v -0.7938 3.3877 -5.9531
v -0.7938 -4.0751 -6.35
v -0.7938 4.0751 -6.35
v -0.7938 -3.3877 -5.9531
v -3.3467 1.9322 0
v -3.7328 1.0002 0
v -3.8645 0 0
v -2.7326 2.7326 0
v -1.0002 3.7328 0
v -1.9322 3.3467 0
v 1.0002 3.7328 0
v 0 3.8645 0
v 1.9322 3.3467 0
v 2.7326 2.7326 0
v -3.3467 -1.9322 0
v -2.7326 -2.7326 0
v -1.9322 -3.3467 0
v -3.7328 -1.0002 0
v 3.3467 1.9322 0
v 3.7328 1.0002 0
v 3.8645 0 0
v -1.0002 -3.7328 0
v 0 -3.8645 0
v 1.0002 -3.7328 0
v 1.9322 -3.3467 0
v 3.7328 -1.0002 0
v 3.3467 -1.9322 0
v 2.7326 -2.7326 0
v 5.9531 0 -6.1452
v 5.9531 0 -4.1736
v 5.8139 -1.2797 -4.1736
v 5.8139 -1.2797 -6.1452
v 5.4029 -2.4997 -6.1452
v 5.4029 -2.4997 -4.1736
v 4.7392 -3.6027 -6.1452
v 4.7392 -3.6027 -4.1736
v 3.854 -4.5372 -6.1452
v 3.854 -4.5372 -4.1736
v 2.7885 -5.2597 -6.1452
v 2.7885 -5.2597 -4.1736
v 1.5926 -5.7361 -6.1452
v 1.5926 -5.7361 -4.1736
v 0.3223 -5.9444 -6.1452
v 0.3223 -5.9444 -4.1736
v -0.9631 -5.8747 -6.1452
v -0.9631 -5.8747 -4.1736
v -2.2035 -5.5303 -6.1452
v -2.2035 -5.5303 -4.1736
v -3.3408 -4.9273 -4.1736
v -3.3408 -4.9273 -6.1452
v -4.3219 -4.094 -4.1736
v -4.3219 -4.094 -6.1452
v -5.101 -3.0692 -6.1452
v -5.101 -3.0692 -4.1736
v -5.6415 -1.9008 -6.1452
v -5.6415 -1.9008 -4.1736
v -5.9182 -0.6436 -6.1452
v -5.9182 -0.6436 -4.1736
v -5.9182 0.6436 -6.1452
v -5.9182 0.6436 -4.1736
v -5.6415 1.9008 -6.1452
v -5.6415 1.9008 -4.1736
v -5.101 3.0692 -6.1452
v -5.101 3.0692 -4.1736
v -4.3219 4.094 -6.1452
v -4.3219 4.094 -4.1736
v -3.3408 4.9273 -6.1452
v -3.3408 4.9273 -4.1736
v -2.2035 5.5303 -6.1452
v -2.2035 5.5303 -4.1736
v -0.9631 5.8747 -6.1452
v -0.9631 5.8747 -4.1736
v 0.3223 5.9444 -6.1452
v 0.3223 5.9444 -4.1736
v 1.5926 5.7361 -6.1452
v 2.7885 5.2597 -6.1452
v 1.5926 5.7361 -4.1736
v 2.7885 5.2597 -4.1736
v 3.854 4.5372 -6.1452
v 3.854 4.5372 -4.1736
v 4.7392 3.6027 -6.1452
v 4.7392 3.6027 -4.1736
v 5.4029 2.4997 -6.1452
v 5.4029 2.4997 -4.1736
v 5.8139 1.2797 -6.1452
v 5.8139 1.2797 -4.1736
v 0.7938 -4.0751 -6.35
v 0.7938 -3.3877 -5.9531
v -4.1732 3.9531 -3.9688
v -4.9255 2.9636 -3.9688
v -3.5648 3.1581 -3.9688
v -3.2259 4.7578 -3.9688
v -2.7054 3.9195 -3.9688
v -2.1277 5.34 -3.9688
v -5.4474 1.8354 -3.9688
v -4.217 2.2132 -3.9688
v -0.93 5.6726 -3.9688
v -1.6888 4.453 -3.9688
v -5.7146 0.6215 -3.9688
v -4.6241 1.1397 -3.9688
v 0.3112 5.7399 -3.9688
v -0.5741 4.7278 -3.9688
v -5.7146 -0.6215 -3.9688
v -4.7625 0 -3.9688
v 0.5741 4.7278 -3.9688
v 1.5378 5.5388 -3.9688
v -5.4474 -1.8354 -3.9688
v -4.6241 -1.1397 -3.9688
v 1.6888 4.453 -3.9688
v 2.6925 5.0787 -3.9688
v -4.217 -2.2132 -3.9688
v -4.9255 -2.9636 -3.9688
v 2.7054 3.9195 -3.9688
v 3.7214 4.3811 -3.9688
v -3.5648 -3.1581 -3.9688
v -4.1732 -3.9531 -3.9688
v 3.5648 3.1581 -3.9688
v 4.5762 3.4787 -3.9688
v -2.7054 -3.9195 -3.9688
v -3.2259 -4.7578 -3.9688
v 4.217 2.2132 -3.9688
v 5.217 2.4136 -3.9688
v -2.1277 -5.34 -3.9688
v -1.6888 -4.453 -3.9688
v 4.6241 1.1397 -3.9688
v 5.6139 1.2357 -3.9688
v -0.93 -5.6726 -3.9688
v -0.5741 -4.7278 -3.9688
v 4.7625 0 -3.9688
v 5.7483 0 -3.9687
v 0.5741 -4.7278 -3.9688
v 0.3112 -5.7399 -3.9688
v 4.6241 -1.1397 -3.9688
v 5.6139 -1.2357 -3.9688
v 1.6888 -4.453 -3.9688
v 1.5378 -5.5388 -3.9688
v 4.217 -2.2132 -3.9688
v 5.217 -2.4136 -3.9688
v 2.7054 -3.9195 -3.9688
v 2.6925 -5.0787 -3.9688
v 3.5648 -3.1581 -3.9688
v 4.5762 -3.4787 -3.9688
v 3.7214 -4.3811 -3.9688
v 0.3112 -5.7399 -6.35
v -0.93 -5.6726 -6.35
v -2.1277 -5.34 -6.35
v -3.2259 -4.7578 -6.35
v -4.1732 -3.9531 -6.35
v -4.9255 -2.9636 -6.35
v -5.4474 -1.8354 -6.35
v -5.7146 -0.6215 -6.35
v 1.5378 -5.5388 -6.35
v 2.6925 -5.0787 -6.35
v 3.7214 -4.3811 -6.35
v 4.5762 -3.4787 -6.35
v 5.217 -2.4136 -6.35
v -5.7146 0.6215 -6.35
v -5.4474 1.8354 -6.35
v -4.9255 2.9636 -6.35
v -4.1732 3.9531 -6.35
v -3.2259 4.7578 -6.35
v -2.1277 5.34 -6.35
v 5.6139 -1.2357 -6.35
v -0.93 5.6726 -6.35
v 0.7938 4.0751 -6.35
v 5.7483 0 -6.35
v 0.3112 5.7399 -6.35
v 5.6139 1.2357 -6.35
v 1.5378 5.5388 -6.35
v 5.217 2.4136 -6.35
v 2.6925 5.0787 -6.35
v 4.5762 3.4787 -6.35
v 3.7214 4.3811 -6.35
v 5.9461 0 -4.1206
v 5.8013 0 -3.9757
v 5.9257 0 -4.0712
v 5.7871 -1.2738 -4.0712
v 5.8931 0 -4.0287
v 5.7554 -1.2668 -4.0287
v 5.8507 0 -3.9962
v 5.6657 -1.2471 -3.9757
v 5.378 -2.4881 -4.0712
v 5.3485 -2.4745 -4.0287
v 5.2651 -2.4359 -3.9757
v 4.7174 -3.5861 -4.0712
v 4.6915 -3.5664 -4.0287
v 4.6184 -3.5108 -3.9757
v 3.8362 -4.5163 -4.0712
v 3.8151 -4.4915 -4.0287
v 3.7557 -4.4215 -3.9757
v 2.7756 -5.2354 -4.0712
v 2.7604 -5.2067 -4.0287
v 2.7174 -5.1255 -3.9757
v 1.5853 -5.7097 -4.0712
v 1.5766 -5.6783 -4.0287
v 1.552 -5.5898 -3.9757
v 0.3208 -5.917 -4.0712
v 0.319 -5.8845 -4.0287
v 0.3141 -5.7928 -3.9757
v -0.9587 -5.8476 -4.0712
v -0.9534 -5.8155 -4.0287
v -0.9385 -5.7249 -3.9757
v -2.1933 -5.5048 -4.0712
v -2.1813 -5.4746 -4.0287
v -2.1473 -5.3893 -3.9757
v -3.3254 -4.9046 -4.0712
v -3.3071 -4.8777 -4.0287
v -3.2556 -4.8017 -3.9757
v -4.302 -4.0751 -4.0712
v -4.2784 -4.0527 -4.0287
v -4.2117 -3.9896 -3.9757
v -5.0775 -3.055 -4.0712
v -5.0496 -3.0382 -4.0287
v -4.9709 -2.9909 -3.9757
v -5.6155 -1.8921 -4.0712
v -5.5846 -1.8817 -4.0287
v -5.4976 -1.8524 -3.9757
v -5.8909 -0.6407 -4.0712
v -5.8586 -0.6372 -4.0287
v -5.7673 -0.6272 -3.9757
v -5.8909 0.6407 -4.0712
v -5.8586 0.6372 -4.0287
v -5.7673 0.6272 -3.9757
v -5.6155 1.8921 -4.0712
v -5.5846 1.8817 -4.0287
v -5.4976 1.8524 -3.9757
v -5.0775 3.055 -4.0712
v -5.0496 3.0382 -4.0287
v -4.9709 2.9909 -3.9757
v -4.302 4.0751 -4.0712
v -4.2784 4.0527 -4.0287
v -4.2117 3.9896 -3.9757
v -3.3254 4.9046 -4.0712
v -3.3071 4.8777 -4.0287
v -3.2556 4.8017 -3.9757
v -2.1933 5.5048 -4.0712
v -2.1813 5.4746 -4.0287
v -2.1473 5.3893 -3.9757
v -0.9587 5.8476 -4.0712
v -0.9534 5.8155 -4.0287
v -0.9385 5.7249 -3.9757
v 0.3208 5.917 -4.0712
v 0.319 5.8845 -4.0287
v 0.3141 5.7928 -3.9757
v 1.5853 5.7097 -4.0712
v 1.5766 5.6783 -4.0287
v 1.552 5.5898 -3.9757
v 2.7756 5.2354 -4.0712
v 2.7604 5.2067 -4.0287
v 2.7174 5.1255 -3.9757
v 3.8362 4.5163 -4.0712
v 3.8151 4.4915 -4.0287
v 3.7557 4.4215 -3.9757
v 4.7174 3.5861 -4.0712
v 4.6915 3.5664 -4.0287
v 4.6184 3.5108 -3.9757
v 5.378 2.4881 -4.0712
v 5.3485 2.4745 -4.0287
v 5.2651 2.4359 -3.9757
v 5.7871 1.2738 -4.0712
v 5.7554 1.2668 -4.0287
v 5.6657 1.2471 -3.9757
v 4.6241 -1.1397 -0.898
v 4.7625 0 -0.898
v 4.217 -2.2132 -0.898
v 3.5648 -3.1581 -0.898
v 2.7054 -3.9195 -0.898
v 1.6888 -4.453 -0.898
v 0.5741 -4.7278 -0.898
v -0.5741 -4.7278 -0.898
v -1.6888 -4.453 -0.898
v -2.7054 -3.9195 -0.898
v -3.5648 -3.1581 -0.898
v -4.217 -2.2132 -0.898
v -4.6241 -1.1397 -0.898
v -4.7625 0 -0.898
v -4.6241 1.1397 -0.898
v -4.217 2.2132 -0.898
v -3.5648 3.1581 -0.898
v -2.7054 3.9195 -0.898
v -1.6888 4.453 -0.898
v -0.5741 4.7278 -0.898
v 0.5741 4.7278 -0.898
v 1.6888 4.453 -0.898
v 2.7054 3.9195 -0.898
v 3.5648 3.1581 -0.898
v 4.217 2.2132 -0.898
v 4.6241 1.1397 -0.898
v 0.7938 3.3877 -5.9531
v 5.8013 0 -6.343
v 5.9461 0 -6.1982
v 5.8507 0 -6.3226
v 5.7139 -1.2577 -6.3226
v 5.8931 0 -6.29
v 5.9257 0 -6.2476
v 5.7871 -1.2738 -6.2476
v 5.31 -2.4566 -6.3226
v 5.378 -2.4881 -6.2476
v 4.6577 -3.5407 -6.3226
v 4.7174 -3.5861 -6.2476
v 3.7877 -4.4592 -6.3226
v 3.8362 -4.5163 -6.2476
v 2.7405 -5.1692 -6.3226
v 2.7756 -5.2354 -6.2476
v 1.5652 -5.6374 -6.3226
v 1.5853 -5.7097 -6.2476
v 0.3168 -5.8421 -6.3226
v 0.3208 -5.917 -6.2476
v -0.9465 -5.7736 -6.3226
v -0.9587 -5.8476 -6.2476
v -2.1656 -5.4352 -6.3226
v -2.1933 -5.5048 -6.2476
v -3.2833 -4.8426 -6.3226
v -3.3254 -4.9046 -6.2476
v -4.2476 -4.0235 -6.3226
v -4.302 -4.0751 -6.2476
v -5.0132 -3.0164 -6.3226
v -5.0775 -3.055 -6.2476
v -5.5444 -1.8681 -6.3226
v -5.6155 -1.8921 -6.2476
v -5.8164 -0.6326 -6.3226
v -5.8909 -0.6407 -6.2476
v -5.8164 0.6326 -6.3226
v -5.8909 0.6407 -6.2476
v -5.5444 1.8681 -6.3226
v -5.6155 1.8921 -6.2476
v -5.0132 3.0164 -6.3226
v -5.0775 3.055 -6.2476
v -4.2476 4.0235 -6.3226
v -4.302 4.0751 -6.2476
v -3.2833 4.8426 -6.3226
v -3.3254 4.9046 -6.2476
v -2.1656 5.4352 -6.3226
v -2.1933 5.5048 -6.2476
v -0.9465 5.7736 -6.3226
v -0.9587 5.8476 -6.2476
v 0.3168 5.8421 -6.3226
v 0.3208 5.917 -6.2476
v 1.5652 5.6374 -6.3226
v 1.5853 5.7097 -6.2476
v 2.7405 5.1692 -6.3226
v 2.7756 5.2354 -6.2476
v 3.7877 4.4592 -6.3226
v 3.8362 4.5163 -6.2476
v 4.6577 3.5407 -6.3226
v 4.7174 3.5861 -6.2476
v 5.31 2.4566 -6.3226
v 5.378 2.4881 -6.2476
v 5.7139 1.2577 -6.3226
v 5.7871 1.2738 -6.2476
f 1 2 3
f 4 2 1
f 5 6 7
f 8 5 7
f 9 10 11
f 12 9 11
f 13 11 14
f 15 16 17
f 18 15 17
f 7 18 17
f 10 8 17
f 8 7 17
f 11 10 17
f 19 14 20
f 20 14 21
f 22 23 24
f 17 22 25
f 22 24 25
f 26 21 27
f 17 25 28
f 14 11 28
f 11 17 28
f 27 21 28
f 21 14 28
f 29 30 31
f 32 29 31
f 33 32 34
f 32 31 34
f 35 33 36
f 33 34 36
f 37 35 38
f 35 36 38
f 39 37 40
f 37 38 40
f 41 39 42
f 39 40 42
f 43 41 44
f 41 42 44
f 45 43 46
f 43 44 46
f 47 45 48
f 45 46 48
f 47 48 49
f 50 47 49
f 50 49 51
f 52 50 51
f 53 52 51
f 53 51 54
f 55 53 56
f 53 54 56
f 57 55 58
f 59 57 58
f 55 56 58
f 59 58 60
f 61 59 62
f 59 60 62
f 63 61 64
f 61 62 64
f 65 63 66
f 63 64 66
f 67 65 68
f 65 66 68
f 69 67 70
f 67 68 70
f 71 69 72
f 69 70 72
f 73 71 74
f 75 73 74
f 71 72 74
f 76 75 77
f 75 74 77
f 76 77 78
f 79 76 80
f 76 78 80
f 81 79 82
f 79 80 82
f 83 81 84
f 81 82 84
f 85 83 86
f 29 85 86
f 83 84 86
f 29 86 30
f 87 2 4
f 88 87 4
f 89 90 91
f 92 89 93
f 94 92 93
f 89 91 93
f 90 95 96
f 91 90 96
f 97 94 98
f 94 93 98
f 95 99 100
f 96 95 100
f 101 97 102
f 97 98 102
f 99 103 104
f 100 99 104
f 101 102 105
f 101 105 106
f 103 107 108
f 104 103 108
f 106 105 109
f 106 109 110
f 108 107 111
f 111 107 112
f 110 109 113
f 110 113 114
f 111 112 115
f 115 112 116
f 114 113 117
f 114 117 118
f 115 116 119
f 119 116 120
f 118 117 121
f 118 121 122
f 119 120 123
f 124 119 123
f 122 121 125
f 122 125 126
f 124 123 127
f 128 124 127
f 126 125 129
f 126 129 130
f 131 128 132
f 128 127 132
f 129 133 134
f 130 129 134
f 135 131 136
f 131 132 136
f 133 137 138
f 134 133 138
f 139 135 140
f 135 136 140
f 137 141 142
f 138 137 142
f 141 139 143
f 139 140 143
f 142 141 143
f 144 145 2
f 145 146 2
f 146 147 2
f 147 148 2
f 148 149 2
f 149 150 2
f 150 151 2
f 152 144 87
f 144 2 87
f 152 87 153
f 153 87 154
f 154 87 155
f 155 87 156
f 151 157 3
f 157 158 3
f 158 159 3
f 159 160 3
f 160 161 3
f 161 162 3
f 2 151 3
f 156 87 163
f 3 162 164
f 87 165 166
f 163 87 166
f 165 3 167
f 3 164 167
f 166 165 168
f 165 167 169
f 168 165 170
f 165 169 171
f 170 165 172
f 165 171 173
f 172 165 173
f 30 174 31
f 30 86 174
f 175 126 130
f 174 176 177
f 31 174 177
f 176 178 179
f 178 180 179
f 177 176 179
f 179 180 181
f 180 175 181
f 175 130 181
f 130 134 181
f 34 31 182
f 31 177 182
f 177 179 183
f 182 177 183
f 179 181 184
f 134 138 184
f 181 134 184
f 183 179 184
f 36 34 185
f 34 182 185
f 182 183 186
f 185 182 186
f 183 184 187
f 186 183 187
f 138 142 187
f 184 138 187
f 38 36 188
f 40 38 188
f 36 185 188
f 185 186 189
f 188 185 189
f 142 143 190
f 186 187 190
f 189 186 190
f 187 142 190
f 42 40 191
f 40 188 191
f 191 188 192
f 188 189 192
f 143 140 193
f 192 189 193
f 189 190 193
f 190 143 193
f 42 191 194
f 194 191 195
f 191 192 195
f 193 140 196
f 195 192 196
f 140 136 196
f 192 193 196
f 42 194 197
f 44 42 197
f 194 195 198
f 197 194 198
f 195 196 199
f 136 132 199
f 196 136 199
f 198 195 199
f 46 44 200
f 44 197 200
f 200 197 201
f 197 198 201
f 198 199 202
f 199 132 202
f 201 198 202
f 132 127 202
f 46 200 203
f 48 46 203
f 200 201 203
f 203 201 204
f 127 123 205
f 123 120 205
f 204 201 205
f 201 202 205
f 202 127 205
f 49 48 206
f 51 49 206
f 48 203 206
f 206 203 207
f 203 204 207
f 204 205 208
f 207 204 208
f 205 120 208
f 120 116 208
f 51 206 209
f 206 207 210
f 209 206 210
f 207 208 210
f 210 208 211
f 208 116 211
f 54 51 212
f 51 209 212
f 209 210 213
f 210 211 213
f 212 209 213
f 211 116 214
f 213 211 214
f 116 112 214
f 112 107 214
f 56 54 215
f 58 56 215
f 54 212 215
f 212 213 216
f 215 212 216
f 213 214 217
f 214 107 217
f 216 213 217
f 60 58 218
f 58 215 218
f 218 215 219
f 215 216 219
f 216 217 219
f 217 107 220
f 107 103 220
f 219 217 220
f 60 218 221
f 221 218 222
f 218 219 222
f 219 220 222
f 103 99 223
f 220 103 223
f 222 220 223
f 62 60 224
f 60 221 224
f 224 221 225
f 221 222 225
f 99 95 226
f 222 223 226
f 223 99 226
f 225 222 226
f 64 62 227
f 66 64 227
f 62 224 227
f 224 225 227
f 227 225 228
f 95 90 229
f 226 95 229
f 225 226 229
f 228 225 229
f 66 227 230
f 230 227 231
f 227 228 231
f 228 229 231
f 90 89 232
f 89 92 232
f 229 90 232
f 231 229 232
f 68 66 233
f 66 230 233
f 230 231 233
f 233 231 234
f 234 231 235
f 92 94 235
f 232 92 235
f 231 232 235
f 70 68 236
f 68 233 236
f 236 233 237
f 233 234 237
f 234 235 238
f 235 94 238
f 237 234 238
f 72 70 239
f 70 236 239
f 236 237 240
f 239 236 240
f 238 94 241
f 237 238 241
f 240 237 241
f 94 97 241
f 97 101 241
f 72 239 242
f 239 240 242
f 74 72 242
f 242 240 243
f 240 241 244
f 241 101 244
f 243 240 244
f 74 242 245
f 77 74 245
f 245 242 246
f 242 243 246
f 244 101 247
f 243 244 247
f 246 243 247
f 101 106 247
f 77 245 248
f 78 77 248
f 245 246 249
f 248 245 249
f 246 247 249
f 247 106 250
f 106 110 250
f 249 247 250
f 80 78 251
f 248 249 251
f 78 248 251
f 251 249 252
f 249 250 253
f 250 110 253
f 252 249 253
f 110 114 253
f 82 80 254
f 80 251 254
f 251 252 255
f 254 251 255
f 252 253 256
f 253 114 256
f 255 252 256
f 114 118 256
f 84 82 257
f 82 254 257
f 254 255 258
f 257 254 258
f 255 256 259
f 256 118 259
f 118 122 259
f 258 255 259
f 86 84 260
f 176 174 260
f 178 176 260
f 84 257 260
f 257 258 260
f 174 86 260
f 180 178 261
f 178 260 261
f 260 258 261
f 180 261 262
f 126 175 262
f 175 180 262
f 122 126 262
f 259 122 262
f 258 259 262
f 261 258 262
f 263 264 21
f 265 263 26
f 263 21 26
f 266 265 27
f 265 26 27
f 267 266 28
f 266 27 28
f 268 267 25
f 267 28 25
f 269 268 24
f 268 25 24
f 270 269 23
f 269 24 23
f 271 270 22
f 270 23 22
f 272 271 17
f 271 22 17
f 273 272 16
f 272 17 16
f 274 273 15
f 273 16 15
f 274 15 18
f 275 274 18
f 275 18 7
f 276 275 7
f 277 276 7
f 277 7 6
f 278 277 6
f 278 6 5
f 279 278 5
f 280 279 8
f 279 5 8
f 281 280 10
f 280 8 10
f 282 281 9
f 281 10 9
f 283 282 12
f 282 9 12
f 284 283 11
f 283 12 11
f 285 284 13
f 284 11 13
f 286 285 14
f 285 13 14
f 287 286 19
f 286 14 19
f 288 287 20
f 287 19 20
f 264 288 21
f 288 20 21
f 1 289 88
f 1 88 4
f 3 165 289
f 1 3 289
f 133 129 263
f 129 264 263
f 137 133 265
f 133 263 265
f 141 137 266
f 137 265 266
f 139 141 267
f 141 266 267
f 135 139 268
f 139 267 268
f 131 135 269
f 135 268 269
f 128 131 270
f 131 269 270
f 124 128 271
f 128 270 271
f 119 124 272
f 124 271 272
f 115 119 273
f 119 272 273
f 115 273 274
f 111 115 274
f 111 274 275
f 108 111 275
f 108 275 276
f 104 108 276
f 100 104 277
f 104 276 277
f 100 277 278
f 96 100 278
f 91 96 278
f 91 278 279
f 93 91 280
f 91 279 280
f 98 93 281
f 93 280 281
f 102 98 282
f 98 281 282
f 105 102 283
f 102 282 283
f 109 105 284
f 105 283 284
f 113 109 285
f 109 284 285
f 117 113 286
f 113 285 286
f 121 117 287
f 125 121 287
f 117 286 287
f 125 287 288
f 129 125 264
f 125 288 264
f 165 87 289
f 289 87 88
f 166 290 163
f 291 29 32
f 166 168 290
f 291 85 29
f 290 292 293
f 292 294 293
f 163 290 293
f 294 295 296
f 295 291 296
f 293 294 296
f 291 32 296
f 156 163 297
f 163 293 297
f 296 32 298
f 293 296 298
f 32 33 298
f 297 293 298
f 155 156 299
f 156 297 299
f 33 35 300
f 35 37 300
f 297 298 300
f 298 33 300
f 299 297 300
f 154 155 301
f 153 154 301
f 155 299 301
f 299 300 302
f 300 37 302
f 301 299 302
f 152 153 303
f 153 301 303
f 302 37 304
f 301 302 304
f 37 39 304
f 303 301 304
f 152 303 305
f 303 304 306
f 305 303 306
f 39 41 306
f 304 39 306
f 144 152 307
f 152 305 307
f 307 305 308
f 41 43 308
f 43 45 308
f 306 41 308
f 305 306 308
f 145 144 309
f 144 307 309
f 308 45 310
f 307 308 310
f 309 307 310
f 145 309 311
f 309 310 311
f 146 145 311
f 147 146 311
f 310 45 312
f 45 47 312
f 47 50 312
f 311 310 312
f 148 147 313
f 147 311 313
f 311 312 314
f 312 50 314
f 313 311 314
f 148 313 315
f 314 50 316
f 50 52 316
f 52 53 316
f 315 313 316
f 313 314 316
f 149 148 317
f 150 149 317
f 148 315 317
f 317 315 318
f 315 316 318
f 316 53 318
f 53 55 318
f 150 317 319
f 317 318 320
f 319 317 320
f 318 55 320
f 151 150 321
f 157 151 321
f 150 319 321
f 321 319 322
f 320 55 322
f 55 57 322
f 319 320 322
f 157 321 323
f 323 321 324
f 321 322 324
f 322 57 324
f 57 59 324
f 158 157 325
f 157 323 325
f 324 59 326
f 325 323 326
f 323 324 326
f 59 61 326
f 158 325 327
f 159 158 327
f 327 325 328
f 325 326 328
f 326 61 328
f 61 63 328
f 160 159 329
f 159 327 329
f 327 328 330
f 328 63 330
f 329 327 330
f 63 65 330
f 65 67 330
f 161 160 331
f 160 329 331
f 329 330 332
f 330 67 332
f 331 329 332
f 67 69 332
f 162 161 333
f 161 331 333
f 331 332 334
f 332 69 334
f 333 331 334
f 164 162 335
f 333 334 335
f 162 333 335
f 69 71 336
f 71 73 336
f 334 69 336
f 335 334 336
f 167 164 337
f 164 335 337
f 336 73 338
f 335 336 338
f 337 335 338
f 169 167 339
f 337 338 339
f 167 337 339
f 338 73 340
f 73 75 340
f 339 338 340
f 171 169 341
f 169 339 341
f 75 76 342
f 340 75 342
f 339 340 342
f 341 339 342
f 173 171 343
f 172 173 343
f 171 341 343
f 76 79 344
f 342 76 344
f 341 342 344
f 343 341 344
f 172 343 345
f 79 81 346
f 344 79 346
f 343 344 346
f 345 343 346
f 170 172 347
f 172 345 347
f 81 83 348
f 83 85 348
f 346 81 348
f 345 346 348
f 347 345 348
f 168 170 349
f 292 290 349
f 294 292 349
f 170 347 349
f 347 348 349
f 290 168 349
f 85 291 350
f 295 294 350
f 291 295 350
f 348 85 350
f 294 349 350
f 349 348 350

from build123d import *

# Parameters (mm, degrees)
FILLET1_R          = 0.20483871
SKETCH2_W          = 1.5875
SKETCH2_H          = 9.525
CUT_EXTRUDE1_DEPTH = 0.396875
CHAMFER1_SIZE      = 0.79375
CHAMFER1_SIZE_2    = 1.374815329


with BuildPart() as part:
    # Sketch1 → Revolve1 (revolve)
    with BuildSketch(Plane(origin=(0, 0, 0), x_dir=(1, 0, 0), z_dir=(0, 1, 0))):
        Polygon((0, 6.35), (5.953125, 6.35), (5.953125, 3.96875), (4.7625, 3.96875), (4.7625, 0.898025612), (3.864474388, 0), (0, 0), align=None)
    revolve(axis=Axis((0, 0, 0), (0, 0, -1)))

    # Fillet1
    fillet1_edges = [part.edges().sort_by_distance(p)[0] for p in [
        (-5.953125, 0, -3.96875),
        (-5.953125, 0, -6.35),
    ]]
    fillet(fillet1_edges, radius=FILLET1_R)

    # Sketch2 → Cut-Extrude1 (cut)
    with BuildSketch(Plane(origin=(0, 0, -6.35), x_dir=(-1, 0, 0), z_dir=(0, 0, -1))):
        Rectangle(SKETCH2_W, SKETCH2_H)
    extrude(amount=-CUT_EXTRUDE1_DEPTH, mode=Mode.SUBTRACT)

    # Chamfer1
    # the kernel refuses this chamfer: 1.374815329, 0.79375 mm, written as the material it adds along each edge
    with BuildSketch(Plane(origin=(-0.79375, -4.7625, -5.953125), x_dir=(0, -0.057893862402671005, -0.9983227437537926), z_dir=(1, 0, 0))) as chamfer1_piece_1_section:
        Polygon((CHAMFER1_SIZE * 0.998322743754, CHAMFER1_SIZE * 0.0578938624027), (-CHAMFER1_SIZE_2 * 0.0578938623819, CHAMFER1_SIZE_2 * 0.998322743396), (0, 0), align=None)
    chamfer1_piece_1 = extrude(amount=1.5875, mode=Mode.PRIVATE)
    chamfer1_piece_1 = split(chamfer1_piece_1, bisect_by=Plane(origin=(0, -4.227849594, -6.35), z_dir=(0, 0, 1)), keep=Keep.TOP, mode=Mode.PRIVATE)
    add(chamfer1_piece_1)
    with BuildSketch(Plane(origin=(0.79375, 4.7625, -5.953125), x_dir=(0, 0.057893862402671005, -0.9983227437537926), z_dir=(-1, 0, 0))) as chamfer1_piece_2_section:
        Polygon((CHAMFER1_SIZE * 0.998322743754, CHAMFER1_SIZE * 0.0578938624027), (-CHAMFER1_SIZE_2 * 0.0578938623819, CHAMFER1_SIZE_2 * 0.998322743396), (0, 0), align=None)
    chamfer1_piece_2 = extrude(amount=1.5875, mode=Mode.PRIVATE)
    chamfer1_piece_2 = split(chamfer1_piece_2, bisect_by=Plane(origin=(0, 4.227849594, -6.35), z_dir=(0, 0, 1)), keep=Keep.TOP, mode=Mode.PRIVATE)
    add(chamfer1_piece_2)


solid = part.part
